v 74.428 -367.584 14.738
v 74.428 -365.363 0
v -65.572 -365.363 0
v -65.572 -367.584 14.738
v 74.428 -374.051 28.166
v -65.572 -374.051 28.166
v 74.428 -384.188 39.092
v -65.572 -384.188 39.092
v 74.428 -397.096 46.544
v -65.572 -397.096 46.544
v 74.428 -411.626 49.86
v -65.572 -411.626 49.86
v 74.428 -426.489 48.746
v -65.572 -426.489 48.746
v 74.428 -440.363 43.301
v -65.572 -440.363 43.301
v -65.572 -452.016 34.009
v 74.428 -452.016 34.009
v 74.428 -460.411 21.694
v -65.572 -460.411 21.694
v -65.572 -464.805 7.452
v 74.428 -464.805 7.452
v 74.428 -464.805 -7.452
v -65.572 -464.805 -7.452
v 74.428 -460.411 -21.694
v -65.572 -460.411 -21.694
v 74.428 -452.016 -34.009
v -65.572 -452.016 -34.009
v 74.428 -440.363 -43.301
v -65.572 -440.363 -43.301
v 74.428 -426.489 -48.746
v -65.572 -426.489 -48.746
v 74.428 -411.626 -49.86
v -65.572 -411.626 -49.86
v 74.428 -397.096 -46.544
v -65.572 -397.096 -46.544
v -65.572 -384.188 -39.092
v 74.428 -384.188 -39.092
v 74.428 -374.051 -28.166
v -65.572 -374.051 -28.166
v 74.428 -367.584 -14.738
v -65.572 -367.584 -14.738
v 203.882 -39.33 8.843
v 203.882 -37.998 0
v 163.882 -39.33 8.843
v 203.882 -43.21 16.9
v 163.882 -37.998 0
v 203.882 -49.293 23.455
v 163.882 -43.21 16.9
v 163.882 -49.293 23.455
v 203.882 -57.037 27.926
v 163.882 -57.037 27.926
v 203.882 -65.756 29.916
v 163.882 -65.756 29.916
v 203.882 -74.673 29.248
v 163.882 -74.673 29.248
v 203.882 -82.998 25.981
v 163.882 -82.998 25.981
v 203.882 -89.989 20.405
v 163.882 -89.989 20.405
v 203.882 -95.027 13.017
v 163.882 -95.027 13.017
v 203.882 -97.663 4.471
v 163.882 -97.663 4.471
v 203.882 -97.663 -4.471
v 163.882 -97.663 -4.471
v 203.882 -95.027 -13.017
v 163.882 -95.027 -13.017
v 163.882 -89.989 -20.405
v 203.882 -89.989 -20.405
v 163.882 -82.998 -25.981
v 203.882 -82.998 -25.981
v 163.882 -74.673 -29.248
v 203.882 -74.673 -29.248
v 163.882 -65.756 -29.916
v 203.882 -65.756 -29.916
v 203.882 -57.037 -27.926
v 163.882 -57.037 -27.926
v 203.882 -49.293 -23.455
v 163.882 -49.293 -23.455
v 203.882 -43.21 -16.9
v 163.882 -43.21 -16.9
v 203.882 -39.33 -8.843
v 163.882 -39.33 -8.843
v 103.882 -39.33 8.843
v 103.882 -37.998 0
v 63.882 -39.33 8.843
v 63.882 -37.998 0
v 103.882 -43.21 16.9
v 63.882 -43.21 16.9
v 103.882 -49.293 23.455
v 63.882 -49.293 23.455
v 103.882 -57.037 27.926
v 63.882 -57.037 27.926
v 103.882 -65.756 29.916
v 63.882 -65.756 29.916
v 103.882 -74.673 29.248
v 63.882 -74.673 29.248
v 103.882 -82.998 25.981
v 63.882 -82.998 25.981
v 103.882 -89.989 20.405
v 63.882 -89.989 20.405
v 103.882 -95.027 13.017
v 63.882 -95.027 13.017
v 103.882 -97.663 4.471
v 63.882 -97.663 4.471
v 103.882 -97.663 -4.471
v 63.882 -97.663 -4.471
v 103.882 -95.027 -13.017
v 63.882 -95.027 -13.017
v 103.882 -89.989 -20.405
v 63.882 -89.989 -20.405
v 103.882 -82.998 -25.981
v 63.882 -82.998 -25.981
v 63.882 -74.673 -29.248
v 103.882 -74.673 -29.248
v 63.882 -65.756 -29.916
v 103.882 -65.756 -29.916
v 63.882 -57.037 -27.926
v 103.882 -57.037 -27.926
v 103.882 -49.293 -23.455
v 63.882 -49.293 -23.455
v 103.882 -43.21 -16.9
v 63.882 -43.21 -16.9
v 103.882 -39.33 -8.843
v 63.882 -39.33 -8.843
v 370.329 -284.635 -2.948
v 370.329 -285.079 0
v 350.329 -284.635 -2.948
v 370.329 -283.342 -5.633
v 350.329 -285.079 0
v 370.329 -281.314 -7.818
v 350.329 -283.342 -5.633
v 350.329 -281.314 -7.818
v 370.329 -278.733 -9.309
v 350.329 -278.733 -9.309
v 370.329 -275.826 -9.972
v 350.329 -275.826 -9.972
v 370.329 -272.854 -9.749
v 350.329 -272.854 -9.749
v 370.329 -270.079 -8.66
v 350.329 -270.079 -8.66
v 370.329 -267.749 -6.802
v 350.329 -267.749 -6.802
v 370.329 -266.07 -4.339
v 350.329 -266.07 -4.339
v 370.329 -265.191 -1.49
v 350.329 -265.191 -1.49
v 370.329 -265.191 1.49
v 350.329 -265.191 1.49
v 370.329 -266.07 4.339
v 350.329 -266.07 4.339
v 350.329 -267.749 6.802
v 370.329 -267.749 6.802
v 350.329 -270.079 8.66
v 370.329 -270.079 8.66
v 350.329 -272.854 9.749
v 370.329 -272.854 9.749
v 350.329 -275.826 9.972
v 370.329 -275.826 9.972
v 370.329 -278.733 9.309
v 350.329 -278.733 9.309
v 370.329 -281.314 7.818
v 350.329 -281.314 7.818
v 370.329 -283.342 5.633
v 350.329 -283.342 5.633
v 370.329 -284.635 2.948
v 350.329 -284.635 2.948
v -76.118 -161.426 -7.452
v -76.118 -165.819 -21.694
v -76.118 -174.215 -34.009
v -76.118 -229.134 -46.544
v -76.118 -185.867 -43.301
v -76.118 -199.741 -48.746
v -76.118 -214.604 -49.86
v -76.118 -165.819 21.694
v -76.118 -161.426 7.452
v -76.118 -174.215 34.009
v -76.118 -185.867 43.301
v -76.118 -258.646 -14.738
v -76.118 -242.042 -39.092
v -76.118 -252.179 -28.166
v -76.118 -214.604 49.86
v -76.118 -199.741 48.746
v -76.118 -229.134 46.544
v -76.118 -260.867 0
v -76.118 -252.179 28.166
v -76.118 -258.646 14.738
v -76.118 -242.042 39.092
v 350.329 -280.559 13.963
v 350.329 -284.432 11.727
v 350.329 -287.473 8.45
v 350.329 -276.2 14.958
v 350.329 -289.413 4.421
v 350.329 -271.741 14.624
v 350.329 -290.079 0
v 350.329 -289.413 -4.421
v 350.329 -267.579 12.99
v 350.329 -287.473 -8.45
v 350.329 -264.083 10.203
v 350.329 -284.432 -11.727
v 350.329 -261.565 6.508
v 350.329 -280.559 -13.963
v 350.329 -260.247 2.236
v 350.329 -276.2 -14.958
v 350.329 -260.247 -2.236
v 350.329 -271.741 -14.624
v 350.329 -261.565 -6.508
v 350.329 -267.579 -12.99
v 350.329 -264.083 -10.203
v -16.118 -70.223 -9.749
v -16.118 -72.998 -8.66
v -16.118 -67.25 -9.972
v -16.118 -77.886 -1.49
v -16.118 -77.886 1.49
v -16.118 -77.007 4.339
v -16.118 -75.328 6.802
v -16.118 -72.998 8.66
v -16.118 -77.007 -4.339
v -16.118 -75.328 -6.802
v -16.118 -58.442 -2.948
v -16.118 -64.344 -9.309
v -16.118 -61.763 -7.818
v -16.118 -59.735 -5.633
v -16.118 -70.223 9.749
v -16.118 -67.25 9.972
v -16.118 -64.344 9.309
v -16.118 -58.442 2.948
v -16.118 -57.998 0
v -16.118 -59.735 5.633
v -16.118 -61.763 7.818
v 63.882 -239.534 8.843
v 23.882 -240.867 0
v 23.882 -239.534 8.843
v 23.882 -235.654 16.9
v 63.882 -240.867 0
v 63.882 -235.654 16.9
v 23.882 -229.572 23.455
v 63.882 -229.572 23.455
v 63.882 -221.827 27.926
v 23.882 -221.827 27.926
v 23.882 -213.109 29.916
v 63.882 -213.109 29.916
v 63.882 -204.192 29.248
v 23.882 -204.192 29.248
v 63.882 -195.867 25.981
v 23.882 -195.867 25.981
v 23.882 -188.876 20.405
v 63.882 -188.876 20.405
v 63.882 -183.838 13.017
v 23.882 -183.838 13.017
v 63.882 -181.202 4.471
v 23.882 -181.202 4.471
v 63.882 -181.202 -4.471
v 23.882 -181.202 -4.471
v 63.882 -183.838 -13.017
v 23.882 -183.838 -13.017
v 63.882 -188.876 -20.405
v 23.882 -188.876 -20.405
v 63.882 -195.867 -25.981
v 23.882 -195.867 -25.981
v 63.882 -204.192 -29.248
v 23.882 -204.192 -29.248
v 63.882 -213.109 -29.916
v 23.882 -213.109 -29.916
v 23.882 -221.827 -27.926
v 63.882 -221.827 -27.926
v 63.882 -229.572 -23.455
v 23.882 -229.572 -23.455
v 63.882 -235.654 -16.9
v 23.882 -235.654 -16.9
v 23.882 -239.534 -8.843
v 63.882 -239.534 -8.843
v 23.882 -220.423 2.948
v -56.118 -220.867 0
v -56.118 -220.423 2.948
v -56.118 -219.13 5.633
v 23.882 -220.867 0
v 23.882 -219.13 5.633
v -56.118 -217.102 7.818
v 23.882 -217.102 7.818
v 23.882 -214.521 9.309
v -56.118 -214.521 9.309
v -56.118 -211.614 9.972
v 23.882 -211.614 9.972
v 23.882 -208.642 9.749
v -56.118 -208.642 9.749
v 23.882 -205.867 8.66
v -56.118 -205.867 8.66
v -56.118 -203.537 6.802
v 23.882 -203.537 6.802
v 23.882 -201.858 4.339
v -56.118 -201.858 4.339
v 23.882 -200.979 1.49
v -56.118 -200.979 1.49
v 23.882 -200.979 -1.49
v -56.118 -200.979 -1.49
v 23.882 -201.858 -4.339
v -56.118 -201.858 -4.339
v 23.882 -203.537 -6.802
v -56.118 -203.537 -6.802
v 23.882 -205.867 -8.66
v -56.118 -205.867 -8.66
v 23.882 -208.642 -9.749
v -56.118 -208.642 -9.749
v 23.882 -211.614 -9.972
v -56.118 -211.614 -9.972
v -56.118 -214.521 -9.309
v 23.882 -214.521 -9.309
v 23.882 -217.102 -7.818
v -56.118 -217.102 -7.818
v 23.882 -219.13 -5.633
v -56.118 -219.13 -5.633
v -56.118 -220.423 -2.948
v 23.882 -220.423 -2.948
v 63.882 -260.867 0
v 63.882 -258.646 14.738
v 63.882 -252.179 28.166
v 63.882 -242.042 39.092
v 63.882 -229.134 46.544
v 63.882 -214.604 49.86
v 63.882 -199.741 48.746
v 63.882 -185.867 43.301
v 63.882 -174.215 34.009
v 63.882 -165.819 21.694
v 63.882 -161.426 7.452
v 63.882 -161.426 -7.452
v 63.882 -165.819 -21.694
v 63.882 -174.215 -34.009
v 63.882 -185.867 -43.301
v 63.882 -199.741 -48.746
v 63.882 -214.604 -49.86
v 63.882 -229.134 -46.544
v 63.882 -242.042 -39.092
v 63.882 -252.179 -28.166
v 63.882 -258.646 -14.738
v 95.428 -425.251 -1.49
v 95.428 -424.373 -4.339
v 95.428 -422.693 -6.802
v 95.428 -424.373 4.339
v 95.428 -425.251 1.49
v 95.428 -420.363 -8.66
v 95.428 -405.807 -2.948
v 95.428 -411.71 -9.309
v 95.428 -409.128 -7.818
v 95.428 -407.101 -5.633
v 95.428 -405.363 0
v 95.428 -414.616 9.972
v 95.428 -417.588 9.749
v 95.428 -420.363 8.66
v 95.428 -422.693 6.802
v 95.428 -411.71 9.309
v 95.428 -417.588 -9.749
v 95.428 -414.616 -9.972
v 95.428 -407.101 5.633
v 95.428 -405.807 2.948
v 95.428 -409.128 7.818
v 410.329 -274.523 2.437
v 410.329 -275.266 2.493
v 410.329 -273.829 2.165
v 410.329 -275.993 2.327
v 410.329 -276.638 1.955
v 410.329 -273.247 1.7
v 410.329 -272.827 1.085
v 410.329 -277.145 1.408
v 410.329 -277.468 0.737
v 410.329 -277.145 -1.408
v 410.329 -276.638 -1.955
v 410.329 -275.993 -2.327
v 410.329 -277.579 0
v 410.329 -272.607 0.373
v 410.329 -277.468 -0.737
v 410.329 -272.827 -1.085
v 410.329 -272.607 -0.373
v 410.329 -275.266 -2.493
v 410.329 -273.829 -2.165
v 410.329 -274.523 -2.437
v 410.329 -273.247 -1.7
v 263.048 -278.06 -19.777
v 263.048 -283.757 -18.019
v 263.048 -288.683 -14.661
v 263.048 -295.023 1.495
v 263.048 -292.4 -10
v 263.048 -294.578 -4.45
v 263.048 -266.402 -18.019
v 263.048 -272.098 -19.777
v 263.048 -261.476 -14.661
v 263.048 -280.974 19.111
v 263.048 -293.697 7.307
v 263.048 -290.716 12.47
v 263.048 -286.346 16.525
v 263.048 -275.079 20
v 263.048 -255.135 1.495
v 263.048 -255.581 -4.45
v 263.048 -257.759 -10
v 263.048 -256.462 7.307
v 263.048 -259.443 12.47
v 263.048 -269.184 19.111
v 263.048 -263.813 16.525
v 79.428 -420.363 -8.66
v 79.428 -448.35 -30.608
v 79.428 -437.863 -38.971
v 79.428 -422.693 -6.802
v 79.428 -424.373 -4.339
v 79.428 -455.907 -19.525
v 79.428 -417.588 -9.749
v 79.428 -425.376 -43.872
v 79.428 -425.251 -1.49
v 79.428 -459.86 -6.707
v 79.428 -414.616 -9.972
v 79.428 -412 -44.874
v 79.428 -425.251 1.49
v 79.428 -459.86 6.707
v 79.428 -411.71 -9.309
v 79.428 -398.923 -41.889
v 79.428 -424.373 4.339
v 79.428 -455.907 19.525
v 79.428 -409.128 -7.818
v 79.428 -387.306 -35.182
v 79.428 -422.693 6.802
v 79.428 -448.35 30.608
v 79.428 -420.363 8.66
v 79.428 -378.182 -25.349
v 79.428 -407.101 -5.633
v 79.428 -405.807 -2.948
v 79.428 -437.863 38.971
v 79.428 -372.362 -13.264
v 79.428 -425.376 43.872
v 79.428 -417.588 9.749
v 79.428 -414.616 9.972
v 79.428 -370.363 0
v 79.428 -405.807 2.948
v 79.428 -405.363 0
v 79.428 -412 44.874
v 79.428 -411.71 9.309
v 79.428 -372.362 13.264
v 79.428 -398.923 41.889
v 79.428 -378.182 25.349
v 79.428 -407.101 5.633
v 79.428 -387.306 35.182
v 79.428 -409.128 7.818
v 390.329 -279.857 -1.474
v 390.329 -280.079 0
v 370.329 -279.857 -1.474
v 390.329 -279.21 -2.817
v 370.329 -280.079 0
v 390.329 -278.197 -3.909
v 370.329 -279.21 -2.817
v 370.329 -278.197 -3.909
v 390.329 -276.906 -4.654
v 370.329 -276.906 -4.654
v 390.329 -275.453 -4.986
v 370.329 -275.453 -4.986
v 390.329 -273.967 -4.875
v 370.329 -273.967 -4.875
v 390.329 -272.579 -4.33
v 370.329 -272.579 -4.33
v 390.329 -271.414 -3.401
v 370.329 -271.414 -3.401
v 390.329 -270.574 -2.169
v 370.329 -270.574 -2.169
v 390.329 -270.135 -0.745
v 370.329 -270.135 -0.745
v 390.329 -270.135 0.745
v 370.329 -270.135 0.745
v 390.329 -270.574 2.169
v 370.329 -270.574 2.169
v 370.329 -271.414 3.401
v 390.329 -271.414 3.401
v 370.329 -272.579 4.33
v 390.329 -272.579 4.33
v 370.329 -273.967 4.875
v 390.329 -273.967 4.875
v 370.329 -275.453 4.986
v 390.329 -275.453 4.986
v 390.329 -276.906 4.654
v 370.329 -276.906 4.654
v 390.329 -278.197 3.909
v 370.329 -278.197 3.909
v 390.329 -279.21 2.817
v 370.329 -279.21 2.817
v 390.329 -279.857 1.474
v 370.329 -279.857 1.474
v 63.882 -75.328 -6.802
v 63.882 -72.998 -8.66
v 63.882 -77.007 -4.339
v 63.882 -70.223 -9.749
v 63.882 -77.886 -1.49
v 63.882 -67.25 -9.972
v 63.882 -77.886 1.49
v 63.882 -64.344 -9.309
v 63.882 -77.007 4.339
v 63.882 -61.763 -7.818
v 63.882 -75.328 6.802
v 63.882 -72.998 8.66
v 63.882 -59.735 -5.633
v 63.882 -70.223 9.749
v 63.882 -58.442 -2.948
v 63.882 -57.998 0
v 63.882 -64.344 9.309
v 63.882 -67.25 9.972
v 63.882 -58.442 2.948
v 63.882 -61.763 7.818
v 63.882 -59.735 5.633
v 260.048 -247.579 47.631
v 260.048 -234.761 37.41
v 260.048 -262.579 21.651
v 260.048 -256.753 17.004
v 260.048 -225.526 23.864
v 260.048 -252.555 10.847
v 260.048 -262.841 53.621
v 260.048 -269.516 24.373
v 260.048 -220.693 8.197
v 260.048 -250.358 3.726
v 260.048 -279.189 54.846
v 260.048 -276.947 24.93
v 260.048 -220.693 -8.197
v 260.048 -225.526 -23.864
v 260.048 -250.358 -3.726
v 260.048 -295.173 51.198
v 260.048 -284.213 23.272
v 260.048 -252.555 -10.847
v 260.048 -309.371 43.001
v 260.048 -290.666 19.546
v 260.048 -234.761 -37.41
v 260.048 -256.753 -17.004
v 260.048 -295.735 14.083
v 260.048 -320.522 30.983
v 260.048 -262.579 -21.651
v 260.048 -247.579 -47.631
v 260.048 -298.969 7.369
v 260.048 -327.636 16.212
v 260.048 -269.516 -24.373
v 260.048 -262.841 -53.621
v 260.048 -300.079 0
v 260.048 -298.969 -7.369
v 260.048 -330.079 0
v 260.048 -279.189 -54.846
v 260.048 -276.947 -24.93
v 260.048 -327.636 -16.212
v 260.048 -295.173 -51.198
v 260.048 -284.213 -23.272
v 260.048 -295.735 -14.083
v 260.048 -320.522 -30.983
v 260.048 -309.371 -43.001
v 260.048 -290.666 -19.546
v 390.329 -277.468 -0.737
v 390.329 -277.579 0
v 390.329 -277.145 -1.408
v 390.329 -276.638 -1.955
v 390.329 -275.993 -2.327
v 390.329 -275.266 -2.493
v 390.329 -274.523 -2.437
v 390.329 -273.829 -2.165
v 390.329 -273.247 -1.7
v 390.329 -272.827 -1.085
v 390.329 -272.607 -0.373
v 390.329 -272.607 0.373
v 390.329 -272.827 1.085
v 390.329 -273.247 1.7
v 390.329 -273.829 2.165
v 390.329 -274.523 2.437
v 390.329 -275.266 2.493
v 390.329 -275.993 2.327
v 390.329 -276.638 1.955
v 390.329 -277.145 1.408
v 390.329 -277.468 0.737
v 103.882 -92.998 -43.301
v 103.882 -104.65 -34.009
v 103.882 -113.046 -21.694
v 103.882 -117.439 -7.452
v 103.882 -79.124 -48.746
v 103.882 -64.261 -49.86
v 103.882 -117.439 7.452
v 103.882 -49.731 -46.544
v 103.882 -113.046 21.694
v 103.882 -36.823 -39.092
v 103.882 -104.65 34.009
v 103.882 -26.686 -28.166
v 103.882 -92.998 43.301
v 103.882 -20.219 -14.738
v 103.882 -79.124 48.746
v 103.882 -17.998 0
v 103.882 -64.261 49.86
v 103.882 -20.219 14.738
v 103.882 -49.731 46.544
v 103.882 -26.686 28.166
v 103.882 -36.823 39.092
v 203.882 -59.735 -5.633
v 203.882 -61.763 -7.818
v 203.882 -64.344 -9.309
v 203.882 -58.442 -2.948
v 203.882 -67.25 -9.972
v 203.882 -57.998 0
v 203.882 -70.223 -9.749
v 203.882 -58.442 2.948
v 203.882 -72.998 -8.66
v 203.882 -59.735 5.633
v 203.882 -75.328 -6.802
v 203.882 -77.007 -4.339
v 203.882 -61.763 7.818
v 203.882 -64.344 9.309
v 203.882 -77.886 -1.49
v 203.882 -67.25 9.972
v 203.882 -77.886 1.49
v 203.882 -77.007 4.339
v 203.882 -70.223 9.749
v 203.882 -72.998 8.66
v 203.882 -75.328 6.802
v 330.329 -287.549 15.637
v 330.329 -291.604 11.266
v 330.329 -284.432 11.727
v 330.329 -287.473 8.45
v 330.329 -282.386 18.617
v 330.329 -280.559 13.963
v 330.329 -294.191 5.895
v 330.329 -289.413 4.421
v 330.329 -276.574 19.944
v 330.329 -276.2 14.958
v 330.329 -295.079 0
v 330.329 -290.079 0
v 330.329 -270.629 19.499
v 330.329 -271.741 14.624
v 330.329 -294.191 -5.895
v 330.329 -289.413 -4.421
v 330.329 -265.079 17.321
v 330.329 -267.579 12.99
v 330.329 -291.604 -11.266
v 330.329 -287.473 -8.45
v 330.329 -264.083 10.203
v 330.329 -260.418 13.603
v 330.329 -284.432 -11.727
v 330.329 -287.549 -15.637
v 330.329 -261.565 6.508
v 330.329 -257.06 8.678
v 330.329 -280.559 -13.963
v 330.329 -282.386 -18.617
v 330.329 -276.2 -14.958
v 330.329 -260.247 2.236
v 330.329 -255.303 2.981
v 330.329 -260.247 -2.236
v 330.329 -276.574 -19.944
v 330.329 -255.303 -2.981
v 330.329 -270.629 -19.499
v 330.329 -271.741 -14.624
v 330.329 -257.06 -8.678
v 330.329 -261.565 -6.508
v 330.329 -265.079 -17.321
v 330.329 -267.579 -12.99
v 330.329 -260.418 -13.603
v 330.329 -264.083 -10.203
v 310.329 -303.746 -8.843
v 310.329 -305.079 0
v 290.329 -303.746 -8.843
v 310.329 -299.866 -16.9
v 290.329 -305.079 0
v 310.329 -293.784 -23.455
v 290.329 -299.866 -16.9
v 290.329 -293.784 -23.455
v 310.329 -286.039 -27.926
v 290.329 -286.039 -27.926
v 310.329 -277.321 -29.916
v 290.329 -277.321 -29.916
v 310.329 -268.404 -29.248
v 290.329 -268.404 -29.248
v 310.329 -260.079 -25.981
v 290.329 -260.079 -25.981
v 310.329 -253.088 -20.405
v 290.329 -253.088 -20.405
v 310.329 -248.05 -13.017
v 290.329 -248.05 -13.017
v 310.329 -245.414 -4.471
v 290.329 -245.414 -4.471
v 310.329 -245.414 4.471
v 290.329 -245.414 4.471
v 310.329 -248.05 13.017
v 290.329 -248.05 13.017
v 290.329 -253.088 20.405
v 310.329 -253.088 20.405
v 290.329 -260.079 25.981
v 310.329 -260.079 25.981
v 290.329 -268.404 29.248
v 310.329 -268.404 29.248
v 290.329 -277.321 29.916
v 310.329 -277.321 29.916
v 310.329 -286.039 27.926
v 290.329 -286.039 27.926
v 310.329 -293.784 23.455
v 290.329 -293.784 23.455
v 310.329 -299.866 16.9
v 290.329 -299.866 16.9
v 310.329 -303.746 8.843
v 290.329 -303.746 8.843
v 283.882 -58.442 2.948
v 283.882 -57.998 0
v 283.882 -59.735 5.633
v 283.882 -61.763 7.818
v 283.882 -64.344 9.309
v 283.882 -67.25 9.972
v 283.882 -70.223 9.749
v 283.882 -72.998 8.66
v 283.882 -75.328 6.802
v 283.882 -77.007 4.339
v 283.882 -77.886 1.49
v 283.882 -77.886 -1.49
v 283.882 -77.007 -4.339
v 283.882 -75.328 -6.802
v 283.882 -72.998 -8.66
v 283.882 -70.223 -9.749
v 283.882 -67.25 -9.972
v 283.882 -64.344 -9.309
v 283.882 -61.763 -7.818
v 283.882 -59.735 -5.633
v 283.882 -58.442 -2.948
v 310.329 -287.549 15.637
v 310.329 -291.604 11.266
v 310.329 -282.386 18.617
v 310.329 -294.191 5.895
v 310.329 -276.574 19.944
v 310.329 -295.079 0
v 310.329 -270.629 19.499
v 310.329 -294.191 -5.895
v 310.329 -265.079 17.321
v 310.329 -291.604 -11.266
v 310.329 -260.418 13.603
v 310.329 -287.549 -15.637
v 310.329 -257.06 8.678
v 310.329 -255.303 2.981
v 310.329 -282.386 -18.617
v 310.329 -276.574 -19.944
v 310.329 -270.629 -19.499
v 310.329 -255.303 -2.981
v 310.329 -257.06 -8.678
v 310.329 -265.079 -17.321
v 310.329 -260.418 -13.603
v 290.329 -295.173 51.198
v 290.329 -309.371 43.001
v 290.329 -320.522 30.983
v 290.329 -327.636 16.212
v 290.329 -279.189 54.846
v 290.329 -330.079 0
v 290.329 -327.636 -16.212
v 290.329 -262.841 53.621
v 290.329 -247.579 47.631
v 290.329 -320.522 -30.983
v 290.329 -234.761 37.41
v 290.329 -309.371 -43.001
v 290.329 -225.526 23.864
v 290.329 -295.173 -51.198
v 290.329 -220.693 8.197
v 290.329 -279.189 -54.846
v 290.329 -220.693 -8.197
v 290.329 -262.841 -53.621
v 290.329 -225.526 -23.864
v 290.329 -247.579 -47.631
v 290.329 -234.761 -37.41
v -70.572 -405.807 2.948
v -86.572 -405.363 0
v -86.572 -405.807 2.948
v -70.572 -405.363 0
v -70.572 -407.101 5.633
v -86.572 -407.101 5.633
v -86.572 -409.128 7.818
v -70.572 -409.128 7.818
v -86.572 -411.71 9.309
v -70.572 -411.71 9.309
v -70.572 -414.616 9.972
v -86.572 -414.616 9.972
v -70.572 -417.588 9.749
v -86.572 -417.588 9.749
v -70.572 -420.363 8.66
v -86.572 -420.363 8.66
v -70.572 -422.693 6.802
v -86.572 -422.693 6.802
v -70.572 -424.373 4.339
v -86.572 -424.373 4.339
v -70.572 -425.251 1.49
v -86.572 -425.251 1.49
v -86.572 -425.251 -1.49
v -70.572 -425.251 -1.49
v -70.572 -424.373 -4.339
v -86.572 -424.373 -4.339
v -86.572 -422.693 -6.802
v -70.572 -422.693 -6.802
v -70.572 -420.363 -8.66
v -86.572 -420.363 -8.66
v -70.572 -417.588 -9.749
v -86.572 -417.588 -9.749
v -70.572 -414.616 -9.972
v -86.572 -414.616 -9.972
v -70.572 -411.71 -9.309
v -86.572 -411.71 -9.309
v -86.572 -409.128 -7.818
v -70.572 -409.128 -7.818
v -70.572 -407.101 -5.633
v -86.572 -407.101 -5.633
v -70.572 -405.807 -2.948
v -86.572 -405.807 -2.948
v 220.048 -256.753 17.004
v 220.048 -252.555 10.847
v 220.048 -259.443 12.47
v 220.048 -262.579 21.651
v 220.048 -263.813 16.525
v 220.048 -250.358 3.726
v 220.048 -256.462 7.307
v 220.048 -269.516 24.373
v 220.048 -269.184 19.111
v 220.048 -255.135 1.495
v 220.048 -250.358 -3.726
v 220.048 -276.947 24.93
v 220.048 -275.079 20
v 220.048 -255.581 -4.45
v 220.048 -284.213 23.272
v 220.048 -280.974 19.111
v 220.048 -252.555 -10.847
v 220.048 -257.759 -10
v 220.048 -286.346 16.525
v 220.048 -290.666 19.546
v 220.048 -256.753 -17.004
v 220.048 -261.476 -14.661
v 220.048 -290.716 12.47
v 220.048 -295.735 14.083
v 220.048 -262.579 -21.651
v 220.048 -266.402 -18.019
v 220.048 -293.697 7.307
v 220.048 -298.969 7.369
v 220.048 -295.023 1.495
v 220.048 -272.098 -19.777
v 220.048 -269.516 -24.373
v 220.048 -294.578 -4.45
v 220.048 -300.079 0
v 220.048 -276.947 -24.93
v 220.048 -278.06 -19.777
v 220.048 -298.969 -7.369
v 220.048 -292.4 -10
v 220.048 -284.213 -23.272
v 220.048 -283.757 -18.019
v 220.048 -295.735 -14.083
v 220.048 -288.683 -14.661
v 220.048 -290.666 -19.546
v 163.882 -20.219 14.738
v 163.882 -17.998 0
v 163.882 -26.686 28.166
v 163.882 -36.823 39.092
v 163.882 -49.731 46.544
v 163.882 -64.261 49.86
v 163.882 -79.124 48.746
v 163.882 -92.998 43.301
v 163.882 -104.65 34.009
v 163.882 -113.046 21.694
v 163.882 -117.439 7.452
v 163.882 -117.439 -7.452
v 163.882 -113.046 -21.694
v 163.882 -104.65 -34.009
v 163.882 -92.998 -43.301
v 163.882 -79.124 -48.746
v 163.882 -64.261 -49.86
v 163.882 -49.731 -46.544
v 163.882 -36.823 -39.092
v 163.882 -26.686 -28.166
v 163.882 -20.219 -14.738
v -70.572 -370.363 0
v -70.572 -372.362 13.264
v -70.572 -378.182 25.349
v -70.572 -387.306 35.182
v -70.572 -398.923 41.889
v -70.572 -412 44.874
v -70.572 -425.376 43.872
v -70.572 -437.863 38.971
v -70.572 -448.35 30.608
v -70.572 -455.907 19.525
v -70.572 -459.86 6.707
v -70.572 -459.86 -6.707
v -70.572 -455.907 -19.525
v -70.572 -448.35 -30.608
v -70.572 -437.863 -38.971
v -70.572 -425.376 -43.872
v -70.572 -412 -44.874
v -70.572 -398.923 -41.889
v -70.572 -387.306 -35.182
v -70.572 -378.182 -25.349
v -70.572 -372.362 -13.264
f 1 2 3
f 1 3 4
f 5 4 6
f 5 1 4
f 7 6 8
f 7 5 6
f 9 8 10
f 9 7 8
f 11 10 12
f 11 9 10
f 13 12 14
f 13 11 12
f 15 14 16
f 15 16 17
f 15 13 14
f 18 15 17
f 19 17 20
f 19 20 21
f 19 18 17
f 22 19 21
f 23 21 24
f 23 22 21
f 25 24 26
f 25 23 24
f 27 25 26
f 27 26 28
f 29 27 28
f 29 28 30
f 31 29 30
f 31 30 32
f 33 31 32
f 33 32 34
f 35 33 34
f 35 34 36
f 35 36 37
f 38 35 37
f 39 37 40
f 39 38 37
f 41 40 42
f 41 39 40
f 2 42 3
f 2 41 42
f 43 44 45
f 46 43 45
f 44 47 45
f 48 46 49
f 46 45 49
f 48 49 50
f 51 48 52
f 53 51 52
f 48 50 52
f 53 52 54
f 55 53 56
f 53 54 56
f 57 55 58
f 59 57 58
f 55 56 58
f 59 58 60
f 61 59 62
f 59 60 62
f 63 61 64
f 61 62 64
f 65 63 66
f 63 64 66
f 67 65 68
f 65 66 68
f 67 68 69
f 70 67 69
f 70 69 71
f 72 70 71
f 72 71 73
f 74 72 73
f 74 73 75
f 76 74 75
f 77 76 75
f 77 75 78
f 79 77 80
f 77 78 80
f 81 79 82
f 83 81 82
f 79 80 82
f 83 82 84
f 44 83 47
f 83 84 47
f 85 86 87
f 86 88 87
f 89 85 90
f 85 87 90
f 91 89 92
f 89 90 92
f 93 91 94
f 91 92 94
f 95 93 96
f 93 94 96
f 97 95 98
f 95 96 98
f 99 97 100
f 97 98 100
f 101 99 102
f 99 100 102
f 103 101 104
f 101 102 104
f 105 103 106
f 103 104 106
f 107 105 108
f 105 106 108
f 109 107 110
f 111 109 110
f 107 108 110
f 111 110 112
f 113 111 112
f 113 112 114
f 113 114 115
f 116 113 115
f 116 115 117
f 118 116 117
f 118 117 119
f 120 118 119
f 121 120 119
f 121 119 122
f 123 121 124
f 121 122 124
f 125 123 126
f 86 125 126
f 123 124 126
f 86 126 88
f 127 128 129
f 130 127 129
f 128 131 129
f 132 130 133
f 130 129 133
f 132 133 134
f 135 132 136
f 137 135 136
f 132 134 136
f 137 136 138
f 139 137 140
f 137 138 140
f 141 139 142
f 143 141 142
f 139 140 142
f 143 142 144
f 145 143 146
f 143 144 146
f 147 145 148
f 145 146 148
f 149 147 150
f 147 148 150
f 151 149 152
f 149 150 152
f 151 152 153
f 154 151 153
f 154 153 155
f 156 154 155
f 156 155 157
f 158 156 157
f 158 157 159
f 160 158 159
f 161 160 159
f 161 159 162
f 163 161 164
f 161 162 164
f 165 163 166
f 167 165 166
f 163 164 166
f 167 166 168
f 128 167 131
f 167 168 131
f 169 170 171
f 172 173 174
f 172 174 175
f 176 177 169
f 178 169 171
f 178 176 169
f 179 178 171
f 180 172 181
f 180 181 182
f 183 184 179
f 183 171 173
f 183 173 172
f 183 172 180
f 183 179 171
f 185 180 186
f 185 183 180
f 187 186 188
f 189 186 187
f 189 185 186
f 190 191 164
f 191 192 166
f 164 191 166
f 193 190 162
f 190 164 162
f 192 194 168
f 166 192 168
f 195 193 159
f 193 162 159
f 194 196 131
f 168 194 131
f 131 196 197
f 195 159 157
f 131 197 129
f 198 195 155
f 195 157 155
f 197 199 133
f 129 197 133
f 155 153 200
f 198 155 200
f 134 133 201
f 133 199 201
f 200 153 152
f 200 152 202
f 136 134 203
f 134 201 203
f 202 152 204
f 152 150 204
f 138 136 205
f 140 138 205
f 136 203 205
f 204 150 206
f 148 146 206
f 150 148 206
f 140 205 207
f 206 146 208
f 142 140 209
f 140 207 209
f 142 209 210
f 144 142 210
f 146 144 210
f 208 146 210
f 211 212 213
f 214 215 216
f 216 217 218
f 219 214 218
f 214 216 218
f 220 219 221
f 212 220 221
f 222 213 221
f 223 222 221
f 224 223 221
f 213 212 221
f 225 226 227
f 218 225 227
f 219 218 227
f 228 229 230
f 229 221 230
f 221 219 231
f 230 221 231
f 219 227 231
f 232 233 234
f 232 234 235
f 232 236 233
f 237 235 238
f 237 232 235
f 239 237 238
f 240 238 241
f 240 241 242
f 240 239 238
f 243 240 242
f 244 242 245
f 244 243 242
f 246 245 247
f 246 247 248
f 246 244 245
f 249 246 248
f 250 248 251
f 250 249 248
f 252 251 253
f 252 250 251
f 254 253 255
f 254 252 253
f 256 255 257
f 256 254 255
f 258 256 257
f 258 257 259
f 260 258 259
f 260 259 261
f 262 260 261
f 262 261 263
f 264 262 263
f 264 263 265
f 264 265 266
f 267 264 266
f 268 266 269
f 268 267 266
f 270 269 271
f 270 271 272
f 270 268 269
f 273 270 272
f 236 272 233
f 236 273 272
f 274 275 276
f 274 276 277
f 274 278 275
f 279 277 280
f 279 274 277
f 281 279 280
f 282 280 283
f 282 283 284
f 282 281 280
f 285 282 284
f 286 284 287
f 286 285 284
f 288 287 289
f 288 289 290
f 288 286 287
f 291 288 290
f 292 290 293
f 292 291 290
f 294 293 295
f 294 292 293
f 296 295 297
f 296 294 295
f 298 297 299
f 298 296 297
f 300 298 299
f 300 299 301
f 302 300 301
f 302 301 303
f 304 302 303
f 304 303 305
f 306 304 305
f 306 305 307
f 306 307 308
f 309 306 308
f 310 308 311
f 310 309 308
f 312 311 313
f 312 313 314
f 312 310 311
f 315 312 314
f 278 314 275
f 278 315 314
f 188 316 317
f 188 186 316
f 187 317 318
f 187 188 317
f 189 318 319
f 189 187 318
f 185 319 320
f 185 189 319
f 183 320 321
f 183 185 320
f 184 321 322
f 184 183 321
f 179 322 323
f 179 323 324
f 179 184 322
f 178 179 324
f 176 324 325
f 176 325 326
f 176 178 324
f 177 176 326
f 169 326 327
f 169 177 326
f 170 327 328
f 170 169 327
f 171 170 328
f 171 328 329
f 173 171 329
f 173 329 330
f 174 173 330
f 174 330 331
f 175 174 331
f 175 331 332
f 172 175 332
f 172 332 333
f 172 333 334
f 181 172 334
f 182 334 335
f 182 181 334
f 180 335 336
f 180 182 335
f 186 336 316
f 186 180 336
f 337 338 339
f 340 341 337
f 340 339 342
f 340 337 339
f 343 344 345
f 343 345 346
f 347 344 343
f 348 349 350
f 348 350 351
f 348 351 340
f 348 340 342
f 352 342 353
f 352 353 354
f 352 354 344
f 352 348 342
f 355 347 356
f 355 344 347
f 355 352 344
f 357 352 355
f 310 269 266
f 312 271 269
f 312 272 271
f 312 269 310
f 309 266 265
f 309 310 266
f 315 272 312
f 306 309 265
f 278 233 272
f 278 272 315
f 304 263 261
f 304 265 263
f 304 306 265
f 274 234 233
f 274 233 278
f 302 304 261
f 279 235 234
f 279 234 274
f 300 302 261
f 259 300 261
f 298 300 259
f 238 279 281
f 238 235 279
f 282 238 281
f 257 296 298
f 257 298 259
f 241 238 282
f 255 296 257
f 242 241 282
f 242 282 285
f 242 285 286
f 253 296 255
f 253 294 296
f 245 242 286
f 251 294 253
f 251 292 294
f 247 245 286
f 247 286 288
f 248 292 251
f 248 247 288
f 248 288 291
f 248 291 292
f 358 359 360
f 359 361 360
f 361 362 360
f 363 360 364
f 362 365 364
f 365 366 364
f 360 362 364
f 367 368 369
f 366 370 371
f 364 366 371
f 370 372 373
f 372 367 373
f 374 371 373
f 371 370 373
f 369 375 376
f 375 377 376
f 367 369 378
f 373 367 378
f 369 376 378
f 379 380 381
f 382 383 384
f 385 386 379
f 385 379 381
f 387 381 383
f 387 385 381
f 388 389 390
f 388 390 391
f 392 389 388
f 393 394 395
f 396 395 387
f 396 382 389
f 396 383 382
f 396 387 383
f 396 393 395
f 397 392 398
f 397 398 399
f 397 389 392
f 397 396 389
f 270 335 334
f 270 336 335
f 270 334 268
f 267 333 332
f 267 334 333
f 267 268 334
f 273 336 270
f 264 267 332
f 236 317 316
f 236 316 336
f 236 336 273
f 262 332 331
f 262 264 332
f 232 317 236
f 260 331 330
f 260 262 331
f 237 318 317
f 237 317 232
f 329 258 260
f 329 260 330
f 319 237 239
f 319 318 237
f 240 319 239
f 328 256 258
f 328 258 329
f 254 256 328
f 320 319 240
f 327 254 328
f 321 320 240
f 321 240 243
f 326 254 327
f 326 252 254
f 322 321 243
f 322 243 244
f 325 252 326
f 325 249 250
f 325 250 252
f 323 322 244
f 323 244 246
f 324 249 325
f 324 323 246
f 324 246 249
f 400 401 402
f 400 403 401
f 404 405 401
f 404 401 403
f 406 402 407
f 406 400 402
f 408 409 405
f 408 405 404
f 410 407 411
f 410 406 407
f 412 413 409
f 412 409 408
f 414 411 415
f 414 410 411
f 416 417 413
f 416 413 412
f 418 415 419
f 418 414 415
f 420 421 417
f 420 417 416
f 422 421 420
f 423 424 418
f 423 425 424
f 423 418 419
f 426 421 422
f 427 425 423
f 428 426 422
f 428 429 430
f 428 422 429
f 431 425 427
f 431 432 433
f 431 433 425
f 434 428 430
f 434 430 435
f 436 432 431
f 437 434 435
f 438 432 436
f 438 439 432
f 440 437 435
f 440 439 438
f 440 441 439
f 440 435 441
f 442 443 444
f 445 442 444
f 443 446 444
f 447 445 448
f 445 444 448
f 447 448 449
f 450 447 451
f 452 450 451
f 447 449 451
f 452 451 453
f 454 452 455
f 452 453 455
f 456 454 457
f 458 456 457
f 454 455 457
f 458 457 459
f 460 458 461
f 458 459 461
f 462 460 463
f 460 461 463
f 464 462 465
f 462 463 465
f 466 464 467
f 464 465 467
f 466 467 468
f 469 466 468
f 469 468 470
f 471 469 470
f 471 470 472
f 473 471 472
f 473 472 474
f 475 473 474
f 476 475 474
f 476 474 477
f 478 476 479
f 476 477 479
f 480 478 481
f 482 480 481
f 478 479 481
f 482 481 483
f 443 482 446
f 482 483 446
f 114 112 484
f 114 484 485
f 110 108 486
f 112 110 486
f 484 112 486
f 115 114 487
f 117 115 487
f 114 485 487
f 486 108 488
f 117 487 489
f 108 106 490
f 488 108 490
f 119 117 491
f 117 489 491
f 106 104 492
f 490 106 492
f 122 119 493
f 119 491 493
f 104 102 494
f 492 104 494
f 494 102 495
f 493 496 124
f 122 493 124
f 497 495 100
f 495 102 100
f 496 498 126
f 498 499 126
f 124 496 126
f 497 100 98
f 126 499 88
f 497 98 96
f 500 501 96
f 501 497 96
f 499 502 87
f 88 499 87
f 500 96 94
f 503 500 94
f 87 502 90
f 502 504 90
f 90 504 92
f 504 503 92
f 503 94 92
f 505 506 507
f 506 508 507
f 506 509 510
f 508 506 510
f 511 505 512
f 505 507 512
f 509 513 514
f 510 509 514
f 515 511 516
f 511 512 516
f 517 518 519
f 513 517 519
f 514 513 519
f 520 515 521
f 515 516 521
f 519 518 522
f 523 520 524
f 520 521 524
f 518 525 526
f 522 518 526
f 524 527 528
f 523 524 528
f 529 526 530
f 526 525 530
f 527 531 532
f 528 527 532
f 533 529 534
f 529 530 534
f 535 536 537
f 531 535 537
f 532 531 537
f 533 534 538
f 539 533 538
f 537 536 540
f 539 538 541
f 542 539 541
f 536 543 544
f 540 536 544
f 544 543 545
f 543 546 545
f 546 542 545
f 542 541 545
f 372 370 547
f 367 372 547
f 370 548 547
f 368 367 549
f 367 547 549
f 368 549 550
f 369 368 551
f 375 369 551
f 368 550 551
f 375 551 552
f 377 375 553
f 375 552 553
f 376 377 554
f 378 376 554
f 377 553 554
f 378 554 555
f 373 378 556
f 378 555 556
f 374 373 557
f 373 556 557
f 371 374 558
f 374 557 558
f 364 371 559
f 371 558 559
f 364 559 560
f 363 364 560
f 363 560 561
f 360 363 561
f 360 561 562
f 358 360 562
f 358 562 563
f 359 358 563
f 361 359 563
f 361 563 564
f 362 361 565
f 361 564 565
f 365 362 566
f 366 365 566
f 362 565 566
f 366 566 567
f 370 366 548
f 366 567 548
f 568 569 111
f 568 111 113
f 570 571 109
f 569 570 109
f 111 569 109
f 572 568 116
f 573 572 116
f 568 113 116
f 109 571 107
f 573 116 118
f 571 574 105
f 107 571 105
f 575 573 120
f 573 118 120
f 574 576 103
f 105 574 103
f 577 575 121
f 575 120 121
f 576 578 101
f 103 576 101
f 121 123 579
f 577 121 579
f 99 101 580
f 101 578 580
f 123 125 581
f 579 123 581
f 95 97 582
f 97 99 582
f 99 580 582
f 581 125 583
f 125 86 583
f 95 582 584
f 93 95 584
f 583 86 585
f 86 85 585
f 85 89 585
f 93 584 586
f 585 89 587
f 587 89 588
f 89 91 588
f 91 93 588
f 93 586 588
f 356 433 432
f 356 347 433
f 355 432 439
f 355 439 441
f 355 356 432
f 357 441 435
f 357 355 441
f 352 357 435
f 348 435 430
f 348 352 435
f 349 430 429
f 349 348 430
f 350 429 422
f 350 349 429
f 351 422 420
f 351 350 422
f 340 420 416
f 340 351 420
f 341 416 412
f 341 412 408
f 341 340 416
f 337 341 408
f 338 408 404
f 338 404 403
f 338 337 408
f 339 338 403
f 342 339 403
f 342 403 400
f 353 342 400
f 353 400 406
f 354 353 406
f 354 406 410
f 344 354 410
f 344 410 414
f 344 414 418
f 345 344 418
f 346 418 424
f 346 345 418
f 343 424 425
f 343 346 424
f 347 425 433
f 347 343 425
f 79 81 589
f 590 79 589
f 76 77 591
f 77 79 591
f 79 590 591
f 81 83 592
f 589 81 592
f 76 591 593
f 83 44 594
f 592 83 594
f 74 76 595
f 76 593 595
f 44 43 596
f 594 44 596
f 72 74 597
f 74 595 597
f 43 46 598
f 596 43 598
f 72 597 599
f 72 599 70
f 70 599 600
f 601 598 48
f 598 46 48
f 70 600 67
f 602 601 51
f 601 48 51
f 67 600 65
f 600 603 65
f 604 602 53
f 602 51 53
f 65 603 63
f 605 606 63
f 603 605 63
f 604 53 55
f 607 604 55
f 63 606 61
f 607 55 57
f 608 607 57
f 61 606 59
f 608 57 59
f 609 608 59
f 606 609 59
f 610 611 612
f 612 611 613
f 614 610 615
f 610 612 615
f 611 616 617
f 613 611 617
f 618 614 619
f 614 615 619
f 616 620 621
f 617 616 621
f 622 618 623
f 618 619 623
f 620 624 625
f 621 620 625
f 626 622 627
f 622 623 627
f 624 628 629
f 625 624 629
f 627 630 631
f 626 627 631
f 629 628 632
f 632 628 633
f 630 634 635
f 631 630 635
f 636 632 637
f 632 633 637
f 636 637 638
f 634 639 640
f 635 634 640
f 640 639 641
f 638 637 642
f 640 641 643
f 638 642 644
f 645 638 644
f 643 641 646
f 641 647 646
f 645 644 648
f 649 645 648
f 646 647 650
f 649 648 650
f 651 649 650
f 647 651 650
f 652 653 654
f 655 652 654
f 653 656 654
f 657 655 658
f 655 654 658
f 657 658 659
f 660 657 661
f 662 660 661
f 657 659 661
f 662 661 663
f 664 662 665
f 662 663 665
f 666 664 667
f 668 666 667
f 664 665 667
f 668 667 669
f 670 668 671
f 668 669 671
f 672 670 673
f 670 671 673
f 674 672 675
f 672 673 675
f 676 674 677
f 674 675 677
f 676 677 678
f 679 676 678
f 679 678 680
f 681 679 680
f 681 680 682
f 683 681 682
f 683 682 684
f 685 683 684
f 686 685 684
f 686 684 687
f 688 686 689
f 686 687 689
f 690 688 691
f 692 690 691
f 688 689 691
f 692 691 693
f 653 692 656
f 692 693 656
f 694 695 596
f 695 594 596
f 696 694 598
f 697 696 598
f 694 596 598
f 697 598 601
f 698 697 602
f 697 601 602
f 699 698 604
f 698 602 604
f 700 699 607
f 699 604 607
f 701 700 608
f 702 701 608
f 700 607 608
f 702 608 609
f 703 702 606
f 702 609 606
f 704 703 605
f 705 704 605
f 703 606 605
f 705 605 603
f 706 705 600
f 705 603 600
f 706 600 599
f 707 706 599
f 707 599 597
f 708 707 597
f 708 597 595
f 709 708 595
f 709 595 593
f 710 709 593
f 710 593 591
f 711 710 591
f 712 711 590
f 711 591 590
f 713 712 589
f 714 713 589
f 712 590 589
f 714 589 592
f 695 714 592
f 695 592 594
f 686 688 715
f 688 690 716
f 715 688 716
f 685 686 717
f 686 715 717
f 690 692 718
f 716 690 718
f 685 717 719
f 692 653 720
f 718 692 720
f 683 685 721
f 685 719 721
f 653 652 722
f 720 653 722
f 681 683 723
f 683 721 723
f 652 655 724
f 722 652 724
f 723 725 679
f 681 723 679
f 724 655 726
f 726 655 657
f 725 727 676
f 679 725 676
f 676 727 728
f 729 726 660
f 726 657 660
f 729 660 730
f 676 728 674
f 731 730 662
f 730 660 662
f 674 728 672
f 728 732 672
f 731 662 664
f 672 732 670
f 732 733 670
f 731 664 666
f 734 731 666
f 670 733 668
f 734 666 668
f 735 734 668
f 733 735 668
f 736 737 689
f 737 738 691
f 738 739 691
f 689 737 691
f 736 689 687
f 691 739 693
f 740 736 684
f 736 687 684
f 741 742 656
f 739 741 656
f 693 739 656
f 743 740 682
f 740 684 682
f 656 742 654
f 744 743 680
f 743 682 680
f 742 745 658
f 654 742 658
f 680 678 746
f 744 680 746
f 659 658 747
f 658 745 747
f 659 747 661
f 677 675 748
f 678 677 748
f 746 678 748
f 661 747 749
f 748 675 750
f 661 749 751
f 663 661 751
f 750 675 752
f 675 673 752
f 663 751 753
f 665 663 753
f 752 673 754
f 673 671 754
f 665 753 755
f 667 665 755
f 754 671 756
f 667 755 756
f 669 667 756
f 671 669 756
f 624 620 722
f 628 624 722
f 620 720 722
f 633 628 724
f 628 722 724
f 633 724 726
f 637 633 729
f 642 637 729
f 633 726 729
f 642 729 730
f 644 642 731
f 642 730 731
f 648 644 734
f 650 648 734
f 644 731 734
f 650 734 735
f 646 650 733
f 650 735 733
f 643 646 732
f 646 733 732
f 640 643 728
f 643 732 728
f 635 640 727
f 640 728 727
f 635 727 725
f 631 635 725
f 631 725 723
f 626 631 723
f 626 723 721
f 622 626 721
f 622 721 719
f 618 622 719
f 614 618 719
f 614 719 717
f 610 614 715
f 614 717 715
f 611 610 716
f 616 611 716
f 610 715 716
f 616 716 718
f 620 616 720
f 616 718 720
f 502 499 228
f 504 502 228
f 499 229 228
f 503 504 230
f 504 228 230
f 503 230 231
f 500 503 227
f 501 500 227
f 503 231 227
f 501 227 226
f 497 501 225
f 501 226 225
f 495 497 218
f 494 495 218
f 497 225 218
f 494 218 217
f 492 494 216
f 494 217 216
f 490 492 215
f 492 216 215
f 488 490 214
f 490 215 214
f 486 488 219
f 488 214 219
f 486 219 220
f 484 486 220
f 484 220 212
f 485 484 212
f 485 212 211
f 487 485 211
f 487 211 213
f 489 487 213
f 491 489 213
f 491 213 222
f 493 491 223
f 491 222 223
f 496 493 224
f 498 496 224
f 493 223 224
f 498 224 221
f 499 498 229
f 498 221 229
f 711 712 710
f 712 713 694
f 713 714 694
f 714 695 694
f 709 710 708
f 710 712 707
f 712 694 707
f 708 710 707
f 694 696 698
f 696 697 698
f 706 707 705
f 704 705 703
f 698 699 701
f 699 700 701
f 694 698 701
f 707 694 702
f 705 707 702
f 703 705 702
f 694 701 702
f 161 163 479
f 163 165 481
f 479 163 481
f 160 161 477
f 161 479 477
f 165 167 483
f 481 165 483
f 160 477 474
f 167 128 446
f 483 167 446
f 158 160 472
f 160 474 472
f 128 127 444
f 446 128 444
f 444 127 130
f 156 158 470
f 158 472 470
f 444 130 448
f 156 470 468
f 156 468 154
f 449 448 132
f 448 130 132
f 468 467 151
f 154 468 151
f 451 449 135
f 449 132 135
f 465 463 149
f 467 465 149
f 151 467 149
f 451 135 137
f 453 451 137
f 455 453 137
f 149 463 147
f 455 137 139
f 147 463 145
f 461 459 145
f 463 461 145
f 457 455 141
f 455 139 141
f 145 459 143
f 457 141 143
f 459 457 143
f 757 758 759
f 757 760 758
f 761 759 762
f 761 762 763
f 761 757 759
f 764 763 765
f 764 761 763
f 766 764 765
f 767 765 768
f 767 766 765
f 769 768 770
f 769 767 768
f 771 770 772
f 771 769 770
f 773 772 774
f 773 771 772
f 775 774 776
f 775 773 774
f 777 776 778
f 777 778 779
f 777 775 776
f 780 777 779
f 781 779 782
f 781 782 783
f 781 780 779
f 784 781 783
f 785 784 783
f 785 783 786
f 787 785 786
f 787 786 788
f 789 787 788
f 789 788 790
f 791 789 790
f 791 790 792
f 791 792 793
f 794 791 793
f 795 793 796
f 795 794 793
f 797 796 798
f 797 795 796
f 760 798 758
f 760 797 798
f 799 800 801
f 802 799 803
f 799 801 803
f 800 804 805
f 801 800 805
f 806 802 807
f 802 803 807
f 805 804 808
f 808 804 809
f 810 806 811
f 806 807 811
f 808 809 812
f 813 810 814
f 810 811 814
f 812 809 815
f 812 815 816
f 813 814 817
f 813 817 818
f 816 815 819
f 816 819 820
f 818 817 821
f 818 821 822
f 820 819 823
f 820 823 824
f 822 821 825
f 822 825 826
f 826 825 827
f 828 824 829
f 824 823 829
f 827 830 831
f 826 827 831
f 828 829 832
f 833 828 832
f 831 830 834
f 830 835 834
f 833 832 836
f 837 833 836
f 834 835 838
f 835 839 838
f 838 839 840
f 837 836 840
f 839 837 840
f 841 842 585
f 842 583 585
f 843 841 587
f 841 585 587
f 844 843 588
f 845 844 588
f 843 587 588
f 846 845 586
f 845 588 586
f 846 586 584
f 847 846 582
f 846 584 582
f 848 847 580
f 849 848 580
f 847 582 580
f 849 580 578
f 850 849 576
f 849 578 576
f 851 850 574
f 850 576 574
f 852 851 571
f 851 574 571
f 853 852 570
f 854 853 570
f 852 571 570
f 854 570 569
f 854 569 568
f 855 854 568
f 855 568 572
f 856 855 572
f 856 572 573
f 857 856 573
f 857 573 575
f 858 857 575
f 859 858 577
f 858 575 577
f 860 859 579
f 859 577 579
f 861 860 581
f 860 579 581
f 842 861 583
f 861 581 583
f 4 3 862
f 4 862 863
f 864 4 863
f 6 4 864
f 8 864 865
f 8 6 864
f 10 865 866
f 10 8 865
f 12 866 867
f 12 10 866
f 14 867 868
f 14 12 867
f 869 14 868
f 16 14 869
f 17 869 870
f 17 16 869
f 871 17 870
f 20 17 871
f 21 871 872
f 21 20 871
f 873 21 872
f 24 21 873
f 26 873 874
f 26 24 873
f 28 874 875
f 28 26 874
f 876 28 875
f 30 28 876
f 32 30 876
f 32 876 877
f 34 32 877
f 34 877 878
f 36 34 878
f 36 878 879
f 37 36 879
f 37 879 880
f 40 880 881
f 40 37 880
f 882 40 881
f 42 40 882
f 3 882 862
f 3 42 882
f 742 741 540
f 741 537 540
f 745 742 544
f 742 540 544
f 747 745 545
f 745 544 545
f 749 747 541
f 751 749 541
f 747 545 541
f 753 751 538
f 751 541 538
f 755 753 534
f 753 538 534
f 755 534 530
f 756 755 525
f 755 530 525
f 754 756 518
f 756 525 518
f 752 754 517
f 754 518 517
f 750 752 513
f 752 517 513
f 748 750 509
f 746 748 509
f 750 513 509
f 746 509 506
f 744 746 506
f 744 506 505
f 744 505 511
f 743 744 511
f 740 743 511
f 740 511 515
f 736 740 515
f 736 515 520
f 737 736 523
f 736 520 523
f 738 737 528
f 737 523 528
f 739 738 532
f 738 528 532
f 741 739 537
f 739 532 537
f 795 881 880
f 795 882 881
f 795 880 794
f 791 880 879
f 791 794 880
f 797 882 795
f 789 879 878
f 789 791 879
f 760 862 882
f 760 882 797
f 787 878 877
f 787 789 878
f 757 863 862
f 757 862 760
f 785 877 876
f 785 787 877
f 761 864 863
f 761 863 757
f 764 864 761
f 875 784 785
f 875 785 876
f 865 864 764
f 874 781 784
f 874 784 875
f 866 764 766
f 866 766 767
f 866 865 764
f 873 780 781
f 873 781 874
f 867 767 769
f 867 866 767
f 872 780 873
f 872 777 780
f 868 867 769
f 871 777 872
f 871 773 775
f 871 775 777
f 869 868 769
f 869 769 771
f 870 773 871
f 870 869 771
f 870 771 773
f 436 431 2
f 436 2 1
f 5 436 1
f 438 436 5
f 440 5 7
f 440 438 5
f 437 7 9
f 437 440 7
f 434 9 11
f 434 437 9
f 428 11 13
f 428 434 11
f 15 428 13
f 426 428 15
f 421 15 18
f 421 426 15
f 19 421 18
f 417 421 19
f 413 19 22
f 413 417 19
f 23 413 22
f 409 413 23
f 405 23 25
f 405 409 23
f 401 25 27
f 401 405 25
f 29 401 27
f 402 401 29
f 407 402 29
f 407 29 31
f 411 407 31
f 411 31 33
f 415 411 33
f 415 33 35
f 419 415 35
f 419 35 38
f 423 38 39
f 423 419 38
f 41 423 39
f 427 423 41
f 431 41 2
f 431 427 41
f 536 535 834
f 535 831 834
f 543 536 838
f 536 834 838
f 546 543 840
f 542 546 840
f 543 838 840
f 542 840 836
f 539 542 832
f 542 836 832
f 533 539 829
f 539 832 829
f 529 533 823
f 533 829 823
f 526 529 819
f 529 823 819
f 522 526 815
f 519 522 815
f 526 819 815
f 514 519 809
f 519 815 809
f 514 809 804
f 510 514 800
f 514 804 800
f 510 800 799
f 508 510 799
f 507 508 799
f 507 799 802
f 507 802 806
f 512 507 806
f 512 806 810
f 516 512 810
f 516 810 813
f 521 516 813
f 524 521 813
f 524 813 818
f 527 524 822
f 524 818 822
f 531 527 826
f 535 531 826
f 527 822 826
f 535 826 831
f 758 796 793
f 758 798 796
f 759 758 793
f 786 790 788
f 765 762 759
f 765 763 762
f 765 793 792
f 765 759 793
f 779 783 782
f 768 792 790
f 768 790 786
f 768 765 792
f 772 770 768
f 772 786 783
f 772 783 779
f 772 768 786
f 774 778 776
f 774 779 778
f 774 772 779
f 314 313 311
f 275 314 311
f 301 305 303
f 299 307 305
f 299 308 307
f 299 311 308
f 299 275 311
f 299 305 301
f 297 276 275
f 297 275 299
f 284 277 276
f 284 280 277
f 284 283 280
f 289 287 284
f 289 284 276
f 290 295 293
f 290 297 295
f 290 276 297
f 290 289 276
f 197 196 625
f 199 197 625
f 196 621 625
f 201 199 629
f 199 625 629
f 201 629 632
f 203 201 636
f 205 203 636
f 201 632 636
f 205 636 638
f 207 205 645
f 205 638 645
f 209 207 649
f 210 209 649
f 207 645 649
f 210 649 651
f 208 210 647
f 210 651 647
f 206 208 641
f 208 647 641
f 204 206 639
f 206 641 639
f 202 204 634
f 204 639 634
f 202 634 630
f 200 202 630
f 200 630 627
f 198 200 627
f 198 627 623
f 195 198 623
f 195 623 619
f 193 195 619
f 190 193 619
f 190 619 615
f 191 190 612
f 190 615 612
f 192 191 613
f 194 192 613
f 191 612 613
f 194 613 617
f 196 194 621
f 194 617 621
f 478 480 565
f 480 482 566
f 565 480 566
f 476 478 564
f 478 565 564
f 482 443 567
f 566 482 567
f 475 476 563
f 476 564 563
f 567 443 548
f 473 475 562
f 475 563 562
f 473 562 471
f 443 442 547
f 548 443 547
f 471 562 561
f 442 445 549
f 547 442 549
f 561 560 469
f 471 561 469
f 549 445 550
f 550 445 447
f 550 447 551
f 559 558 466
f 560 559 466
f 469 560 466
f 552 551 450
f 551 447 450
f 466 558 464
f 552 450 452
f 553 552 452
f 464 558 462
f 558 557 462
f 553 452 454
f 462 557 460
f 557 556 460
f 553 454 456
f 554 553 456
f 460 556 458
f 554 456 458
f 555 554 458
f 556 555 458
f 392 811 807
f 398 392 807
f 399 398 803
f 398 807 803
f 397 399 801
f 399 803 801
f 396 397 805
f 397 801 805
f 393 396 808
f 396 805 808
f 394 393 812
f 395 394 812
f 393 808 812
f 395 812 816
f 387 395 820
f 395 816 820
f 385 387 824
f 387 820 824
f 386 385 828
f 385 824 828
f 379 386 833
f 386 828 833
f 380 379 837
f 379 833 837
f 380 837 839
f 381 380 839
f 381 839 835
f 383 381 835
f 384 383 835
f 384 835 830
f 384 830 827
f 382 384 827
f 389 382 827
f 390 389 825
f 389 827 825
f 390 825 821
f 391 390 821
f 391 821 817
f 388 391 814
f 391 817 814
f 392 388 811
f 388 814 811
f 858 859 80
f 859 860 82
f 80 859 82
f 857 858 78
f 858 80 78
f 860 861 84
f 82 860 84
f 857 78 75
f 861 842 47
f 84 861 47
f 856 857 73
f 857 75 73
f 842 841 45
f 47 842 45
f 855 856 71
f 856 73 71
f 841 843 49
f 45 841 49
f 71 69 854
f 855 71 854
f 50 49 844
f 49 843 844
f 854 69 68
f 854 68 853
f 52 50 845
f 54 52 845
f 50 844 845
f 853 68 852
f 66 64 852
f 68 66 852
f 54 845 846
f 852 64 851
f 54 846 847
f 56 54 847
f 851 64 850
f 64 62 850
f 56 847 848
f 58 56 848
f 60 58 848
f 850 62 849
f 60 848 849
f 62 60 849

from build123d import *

# Parameters (mm, degrees)
CROQUIS5_R            = 20
CORTAR_EXTRUIR1_DEPTH = 43
CHAFL_N1_SIZE         = 5
CHAFL_N2_SIZE         = 5


with BuildPart() as part:
    # Croquis2 → Revoluci_n2 (revolve)
    with BuildSketch(Plane.XY):
        Polygon((-16.117690813, -67.997629677), (283.882309187, -67.997629677), (283.882309187, -57.997629677), (203.882309187, -57.997629677), (203.882309187, -37.997629677), (163.882309187, -37.997629677), (163.882309187, -17.997629677), (103.882309187, -17.997629677), (103.882309187, -37.997629677), (63.882309187, -37.997629677), (63.882309187, -57.997629677), (-16.117690813, -57.997629677), align=None)
    revolve(axis=Axis((-83.796377596, -67.997629677, 0), (1, 0, 0)))


with BuildPart() as body_2:
    # Croquis2_13 → Revoluci_n4 (revolve)
    with BuildSketch(Plane.XY):
        Polygon((-56.117690813, -220.867194058), (-56.117690813, -210.867194058), (-76.117690813, -210.867194058), (-76.117690813, -260.867194058), (63.882309187, -260.867194058), (63.882309187, -240.867194058), (23.882309187, -240.867194058), (23.882309187, -220.867194058), align=None)
    revolve(axis=Axis((101.470830931, -210.867194058, 0), (-1, 0, 0)))


with BuildPart() as body_3:
    # Croquis3 → Revoluci_n5 (revolve)
    with BuildSketch(Plane.XY):
        Polygon((410.329396223, -275.079193053), (410.329396223, -277.579193053), (390.329396223, -277.579193053), (390.329396223, -280.079193053), (370.329396223, -280.079193053), (370.329396223, -285.079193053), (350.329396223, -285.079193053), (350.329396223, -290.079193053), (330.329396223, -290.079193053), (330.329396223, -295.079193053), (310.329396223, -295.079193053), (310.329396223, -305.079193053), (290.329396223, -305.079193053), (290.329396223, -330.079193053), (260.048278244, -330.079193053), (260.048278244, -300.079193053), (220.048278244, -300.079193053), (220.048278244, -275.079193053), align=None)
    revolve(axis=Axis((141.076094876, -275.079193053, 0), (1, 0, 0)))

    # Croquis5 → Cortar-Extruir1 (cut)
    with BuildSketch(Plane.ZY.offset(-220.048278244)):
        with Locations((0, -275.079193053)):
            Circle(CROQUIS5_R)
    extrude(amount=-CORTAR_EXTRUIR1_DEPTH, mode=Mode.SUBTRACT)


with BuildPart() as body_4:
    # Croquis6 → Revoluci_n6 (revolve)
    with BuildSketch(Plane.XY):
        Polygon((-86.571698606, -415.362975234), (-86.571698606, -405.362975234), (-70.571698606, -405.362975234), (-70.571698606, -365.362975234), (79.428301394, -365.362975234), (79.428301394, -405.362975234), (95.428301394, -405.362975234), (95.428301394, -415.362975234), align=None)
    revolve(axis=Axis((-110.390362139, -415.362975234, 0), (1, 0, 0)))

    # Chafl_n1
    chafl_n1_edges = [body_4.edges().sort_by_distance(p)[0] for p in [
        (-70.571698606, -465.362975234, 0),
    ]]
    chamfer(chafl_n1_edges, length=CHAFL_N1_SIZE)

    # Chafl_n2
    chafl_n2_edges = [body_4.edges().sort_by_distance(p)[0] for p in [
        (79.428301394, -465.362975234, 0),
    ]]
    chamfer(chafl_n2_edges, length=CHAFL_N2_SIZE)


solid = Compound([part.part, body_2.part, body_3.part, body_4.part])
